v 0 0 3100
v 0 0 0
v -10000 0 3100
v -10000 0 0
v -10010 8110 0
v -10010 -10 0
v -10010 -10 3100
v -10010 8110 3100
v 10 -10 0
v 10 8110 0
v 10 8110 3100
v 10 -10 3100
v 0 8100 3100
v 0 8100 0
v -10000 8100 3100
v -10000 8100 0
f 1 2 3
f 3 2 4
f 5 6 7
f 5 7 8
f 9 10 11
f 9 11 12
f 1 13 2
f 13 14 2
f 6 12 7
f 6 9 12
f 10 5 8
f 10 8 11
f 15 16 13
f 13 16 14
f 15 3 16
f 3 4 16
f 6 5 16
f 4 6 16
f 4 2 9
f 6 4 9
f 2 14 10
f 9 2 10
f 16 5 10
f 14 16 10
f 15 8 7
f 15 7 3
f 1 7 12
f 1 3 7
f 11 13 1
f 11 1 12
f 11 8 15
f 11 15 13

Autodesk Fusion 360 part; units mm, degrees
sketch "スケッチ1" plane through (0, 0, 0) normal (0, 1, 0) x (1, 0, 0)
sketch "スケッチ2" plane through (0, 0, 0) normal (0, 0, 1) x (1, 0, 0)
  line L0 (0, 0) -> (-10000, 0)
  line L1 (-10000, 0) -> (-10000, 8100)
  line L2 (-10000, 8100) -> (0, 8100)
  line L3 (0, 8100) -> (0, 0)
  line L4 (10, -10) -> (-10010, -10)
  line L5 (-10010, -10) -> (-10010, 8110)
  line L6 (-10010, 8110) -> (10, 8110)
  line L7 (10, 8110) -> (10, -10)
  point P0 (10, -10)
  dimension "d1" = 10000
  dimension "d2" = 8100
  dimension "d4" = 10020
  dimension "d5" = 8120
extrude "押し出し1" add sketch "スケッチ2" along normal blind 3100
